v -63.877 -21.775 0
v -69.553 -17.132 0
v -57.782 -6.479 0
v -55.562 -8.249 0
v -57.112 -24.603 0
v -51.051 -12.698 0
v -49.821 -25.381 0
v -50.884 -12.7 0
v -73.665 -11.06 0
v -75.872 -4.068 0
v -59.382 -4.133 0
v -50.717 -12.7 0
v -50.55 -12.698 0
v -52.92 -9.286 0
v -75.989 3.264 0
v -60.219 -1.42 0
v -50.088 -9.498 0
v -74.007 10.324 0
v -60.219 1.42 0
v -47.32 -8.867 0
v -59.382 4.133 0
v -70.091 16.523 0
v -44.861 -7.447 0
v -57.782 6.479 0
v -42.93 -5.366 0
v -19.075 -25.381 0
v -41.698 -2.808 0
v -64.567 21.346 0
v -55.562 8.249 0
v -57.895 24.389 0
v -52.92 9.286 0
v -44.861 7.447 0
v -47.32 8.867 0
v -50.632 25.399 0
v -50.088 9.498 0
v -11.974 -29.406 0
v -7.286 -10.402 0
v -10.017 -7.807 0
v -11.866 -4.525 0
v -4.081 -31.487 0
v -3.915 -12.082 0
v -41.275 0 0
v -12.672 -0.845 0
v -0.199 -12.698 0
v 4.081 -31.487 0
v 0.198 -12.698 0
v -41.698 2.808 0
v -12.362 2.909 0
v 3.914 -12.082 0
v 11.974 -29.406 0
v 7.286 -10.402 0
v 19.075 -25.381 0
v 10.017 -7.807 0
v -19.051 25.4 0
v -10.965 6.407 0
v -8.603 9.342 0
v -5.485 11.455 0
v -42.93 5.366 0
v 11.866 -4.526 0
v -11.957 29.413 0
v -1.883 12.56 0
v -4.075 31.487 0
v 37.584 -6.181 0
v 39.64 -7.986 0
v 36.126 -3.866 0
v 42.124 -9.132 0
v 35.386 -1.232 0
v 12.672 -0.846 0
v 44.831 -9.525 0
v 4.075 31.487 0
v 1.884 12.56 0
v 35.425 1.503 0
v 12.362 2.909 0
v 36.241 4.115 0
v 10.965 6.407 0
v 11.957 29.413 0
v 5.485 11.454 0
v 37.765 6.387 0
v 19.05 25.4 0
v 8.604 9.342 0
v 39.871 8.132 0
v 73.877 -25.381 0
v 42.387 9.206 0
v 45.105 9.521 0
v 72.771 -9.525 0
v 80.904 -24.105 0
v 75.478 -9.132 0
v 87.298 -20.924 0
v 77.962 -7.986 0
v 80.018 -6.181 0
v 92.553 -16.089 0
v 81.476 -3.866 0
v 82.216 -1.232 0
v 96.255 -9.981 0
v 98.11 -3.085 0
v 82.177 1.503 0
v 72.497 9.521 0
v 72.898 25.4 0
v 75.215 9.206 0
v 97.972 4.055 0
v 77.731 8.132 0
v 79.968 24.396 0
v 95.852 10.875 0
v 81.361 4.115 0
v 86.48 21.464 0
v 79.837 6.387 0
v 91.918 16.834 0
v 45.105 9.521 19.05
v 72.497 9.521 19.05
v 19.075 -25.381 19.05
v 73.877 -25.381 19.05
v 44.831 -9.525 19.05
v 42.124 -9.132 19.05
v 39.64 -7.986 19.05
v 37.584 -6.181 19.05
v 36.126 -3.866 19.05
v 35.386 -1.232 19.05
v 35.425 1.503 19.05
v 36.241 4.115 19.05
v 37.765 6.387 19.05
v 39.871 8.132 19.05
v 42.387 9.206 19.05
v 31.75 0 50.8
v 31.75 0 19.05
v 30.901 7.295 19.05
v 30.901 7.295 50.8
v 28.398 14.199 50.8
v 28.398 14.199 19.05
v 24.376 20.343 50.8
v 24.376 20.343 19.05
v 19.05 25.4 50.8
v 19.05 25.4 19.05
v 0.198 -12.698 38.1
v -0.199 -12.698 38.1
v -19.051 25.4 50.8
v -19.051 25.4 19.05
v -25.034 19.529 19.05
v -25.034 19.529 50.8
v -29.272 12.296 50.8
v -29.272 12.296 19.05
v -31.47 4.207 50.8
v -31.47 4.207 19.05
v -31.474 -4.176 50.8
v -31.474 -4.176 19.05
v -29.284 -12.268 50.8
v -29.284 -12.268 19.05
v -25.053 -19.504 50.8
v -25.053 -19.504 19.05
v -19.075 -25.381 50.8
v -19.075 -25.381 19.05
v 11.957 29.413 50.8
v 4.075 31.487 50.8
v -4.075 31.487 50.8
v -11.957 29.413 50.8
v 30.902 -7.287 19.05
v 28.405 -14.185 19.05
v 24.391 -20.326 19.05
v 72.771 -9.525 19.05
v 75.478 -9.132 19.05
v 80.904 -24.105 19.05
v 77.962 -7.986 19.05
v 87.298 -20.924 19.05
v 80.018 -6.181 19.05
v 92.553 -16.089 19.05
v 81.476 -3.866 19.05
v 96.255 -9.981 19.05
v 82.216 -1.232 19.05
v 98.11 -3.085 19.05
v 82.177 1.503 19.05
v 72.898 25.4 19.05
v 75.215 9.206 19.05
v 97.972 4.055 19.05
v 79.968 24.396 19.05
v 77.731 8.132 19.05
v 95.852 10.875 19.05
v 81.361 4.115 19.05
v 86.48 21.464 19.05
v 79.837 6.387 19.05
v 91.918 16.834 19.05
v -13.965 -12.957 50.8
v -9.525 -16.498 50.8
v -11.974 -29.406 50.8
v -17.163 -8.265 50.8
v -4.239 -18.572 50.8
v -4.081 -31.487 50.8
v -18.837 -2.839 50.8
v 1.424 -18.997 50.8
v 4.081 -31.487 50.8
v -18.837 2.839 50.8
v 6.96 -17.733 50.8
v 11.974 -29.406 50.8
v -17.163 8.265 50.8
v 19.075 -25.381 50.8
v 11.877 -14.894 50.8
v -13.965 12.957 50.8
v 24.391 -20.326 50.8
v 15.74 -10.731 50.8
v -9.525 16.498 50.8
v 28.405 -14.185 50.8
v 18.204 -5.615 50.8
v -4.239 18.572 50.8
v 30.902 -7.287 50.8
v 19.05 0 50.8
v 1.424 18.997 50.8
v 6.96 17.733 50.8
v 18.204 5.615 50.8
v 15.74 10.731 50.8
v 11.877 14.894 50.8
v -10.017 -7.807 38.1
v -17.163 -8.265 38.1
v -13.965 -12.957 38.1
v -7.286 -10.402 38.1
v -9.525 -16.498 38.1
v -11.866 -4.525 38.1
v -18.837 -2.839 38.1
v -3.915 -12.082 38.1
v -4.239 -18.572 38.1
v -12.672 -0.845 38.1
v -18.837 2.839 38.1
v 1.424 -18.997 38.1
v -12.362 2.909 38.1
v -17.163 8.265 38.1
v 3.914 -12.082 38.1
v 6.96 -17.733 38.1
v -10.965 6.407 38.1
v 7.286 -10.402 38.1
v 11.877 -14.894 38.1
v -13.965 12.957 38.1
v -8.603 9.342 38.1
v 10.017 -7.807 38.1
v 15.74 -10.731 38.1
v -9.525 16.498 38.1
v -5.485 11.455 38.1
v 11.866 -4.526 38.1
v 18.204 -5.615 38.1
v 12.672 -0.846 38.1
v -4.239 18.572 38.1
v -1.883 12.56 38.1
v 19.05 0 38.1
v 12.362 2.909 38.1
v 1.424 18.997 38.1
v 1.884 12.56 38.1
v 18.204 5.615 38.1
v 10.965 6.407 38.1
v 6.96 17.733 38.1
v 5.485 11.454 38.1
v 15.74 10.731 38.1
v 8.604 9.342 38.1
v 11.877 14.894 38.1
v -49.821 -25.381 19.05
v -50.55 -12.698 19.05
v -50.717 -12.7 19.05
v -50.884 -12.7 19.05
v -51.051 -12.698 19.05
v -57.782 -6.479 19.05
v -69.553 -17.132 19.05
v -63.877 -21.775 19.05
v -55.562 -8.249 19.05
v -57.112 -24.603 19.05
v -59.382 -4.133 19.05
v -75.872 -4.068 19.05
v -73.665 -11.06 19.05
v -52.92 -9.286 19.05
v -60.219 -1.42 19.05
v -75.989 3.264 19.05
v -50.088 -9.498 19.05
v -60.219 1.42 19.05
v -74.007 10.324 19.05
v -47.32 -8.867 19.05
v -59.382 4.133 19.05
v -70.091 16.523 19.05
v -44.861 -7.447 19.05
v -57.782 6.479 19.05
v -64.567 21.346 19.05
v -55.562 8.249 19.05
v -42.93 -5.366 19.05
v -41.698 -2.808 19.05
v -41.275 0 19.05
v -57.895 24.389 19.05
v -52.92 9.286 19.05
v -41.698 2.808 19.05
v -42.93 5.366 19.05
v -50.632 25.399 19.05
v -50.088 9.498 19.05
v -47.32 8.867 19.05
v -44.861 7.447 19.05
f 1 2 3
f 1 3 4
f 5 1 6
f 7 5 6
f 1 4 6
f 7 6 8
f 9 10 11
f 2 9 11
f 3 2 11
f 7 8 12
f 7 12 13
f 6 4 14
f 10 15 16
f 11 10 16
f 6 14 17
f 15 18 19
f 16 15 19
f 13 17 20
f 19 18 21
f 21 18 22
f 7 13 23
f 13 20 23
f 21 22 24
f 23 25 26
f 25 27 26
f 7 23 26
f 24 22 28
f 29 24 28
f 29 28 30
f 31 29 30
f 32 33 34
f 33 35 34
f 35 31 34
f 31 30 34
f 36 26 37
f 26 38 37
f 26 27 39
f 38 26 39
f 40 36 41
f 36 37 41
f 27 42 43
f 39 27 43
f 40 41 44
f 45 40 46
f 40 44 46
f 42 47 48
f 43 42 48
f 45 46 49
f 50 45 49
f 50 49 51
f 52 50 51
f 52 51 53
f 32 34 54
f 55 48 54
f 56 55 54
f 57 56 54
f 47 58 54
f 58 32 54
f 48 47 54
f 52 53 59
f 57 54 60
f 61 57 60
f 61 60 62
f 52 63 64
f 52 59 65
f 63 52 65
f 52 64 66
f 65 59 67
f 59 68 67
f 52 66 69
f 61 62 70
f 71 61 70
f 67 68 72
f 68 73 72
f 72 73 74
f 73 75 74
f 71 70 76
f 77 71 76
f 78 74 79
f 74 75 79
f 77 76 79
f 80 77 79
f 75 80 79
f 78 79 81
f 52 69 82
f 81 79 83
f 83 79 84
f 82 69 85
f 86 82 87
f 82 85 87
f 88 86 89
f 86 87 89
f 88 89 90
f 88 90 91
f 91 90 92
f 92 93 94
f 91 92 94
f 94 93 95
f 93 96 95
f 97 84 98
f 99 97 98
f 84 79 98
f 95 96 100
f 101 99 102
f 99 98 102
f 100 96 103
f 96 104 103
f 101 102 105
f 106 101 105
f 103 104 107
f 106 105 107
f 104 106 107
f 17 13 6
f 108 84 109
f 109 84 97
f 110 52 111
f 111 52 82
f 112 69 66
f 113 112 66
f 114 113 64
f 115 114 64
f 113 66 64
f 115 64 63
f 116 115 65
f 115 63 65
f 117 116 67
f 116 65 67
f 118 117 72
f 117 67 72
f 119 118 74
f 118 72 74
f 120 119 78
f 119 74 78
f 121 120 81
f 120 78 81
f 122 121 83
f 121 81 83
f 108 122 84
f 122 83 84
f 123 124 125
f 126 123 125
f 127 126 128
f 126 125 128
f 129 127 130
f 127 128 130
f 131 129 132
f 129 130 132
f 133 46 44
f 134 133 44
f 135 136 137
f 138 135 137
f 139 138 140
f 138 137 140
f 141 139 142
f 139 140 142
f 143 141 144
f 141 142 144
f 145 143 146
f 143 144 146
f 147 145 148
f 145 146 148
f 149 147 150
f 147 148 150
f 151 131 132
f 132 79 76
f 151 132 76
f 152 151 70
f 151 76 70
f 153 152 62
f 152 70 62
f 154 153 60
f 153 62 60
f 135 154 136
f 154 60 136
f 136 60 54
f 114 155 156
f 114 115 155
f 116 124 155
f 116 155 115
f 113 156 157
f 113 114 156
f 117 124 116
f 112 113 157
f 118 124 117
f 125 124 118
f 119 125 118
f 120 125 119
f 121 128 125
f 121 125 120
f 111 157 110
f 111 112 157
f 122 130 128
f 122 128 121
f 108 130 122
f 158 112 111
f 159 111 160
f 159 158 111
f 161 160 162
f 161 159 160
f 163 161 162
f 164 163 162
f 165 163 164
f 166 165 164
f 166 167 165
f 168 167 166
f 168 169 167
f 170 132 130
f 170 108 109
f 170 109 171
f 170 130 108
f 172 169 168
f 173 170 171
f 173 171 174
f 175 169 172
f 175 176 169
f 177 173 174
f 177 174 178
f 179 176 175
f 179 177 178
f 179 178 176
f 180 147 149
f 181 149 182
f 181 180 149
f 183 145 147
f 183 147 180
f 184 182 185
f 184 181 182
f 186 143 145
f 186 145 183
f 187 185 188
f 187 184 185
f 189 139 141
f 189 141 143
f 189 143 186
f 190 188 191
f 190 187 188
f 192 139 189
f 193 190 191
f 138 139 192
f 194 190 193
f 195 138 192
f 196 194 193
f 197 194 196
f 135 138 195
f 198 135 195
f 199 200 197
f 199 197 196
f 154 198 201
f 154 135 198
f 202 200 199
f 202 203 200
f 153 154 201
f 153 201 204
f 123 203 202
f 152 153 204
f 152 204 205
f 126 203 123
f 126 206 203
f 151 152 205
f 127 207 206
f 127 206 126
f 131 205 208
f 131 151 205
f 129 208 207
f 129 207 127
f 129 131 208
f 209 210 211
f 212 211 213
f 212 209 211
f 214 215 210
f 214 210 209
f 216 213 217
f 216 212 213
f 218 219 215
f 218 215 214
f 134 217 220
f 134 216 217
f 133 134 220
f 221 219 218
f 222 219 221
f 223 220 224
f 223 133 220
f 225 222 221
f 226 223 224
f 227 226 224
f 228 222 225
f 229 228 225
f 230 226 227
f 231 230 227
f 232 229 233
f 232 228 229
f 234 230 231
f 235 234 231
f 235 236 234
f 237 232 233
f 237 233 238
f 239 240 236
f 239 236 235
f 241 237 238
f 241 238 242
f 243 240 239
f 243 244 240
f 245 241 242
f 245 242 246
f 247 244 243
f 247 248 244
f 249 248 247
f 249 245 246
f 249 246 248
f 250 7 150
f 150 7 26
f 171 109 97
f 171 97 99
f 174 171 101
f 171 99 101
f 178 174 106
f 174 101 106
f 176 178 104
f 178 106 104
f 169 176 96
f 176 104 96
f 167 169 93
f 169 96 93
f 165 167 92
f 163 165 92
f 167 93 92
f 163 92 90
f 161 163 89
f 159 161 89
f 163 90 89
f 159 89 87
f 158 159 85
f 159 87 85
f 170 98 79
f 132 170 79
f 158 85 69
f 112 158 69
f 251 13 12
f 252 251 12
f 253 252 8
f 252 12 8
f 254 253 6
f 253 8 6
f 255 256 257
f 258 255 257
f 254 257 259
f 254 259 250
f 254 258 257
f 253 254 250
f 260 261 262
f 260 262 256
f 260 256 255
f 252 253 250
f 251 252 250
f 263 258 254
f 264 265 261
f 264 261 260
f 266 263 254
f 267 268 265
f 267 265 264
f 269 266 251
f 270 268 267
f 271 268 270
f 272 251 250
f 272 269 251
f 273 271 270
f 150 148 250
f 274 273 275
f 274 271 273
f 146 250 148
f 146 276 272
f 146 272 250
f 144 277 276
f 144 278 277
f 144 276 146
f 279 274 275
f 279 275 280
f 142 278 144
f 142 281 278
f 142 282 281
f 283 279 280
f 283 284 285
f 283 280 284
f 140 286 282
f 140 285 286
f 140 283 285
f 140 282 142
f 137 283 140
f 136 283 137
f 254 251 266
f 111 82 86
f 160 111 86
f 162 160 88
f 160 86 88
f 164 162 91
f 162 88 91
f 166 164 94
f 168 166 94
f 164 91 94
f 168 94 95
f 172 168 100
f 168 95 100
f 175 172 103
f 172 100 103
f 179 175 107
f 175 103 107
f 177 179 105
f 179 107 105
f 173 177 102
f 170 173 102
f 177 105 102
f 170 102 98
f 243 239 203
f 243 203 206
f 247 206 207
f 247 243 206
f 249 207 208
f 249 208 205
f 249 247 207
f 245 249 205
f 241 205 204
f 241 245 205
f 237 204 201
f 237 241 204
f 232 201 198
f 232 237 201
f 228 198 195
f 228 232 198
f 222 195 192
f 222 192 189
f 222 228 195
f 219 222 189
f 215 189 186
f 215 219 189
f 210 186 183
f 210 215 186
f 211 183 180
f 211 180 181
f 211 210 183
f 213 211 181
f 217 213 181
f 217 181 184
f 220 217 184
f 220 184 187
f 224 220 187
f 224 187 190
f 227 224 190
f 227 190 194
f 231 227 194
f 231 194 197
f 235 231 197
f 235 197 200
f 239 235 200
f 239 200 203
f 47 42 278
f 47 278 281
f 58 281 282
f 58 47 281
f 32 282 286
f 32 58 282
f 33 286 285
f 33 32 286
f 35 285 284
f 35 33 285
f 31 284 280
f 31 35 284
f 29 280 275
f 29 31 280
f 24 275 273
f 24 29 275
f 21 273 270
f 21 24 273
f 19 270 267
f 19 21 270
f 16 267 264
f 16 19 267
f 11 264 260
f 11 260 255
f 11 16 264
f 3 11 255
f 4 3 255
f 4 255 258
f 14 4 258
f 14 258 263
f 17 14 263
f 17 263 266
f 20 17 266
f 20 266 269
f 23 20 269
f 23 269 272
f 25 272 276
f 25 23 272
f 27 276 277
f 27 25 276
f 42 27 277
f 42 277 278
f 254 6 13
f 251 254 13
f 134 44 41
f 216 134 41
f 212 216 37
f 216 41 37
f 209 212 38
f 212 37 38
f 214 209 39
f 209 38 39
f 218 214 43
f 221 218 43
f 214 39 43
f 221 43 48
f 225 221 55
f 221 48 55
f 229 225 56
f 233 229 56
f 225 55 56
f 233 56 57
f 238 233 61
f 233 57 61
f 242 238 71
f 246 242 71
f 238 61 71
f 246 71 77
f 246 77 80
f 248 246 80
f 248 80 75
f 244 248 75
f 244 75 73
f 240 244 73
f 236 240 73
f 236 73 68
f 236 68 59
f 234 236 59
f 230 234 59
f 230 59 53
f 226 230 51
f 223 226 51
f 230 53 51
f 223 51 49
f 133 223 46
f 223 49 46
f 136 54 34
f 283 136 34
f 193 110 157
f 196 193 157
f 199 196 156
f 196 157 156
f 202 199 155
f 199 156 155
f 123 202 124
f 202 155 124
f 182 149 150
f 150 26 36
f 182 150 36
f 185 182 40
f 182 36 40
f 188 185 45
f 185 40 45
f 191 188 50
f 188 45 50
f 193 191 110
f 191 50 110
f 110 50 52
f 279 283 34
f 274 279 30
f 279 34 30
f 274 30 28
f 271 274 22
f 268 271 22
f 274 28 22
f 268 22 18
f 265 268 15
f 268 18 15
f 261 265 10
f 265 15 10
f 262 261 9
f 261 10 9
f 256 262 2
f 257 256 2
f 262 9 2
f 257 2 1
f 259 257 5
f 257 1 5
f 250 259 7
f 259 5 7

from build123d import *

# Parameters (mm, degrees)
F0_R     = 19.05
F1_DEPTH = 50.8
F2_DEPTH = 38.1
F0_R_2   = 9.525
F3_DEPTH = 19.05


with BuildPart() as f1:
    # F0 (on Top) → F1 (new body)
    with BuildSketch(Plane.XY):
        with BuildLine():
            ThreePointArc((19.075155, -25.381114), (28.405093, -14.184963), (31.75, 0))
            ThreePointArc((31.75, 0), (28.398153, 14.198852), (19.050322, 25.399759))
            ThreePointArc((19.050322, 25.399759), (-0.000142, 31.75), (-19.050549, 25.399588))
            ThreePointArc((-19.050549, 25.399588), (-31.749996, 0.015384), (-19.075155, -25.381114))
            ThreePointArc((-19.075155, -25.381114), (0, -31.75), (19.075155, -25.381114))
        make_face()
        Circle(F0_R, mode=Mode.SUBTRACT)
    extrude(amount=F1_DEPTH)

    # F0 (on Top) → F2 (join)
    with BuildSketch(Plane.XY):
        Circle(F0_R)
        with BuildLine():
            ThreePointArc((-0.198518, -12.698448), (0.00023, 12.7), (0.198058, -12.698456))
            Line((0.198058, -12.698456), (-0.198518, -12.698448))
        make_face(mode=Mode.SUBTRACT)
    extrude(amount=F2_DEPTH)

    # F0 (on Top) → F3 (join)
    with BuildSketch(Plane.XY):
        with BuildLine():
            ThreePointArc((19.050322, 25.399759), (28.398153, 14.198852), (31.75, 0))
            ThreePointArc((31.75, 0), (28.405093, -14.184963), (19.075155, -25.381114))
            Line((19.075155, -25.381114), (71.918698, -25.381114))
            Line((71.918698, -25.381114), (73.877302, -25.381114))
            ThreePointArc((73.877302, -25.381114), (98.293277, 0.489799), (72.897886, 25.4))
            Line((72.897886, 25.4), (19.050322, 25.399759))
        make_face()
        with BuildLine():
            ThreePointArc((44.831, -9.525), (35.306985, 0.136988), (45.104947, 9.52106))
            Line((45.104947, 9.52106), (72.497053, 9.52106))
            ThreePointArc((72.497053, 9.52106), (82.295015, 0.136988), (72.771, -9.525))
            Line((72.771, -9.525), (44.831, -9.525))
        make_face(mode=Mode.SUBTRACT)
        with BuildLine():
            ThreePointArc((-19.075155, -25.381114), (-31.749996, 0.015384), (-19.050549, 25.399588))
            Line((-19.050549, 25.399588), (-50.63229, 25.399446))
            ThreePointArc((-50.63229, 25.399446), (-76.196757, -0.4059), (-49.820698, -25.381114))
            Line((-49.820698, -25.381114), (-19.075155, -25.381114))
        make_face()
        with BuildLine():
            ThreePointArc((-50.54993, -12.697538), (-50.80023, -12.7), (-51.05053, -12.697529))
            Line((-51.05053, -12.697529), (-50.54993, -12.697538))
        make_face(mode=Mode.SUBTRACT)
        with Locations((-50.8, 0)):
            Circle(F0_R_2, mode=Mode.SUBTRACT)
    extrude(amount=F3_DEPTH)


solid = f1.part
